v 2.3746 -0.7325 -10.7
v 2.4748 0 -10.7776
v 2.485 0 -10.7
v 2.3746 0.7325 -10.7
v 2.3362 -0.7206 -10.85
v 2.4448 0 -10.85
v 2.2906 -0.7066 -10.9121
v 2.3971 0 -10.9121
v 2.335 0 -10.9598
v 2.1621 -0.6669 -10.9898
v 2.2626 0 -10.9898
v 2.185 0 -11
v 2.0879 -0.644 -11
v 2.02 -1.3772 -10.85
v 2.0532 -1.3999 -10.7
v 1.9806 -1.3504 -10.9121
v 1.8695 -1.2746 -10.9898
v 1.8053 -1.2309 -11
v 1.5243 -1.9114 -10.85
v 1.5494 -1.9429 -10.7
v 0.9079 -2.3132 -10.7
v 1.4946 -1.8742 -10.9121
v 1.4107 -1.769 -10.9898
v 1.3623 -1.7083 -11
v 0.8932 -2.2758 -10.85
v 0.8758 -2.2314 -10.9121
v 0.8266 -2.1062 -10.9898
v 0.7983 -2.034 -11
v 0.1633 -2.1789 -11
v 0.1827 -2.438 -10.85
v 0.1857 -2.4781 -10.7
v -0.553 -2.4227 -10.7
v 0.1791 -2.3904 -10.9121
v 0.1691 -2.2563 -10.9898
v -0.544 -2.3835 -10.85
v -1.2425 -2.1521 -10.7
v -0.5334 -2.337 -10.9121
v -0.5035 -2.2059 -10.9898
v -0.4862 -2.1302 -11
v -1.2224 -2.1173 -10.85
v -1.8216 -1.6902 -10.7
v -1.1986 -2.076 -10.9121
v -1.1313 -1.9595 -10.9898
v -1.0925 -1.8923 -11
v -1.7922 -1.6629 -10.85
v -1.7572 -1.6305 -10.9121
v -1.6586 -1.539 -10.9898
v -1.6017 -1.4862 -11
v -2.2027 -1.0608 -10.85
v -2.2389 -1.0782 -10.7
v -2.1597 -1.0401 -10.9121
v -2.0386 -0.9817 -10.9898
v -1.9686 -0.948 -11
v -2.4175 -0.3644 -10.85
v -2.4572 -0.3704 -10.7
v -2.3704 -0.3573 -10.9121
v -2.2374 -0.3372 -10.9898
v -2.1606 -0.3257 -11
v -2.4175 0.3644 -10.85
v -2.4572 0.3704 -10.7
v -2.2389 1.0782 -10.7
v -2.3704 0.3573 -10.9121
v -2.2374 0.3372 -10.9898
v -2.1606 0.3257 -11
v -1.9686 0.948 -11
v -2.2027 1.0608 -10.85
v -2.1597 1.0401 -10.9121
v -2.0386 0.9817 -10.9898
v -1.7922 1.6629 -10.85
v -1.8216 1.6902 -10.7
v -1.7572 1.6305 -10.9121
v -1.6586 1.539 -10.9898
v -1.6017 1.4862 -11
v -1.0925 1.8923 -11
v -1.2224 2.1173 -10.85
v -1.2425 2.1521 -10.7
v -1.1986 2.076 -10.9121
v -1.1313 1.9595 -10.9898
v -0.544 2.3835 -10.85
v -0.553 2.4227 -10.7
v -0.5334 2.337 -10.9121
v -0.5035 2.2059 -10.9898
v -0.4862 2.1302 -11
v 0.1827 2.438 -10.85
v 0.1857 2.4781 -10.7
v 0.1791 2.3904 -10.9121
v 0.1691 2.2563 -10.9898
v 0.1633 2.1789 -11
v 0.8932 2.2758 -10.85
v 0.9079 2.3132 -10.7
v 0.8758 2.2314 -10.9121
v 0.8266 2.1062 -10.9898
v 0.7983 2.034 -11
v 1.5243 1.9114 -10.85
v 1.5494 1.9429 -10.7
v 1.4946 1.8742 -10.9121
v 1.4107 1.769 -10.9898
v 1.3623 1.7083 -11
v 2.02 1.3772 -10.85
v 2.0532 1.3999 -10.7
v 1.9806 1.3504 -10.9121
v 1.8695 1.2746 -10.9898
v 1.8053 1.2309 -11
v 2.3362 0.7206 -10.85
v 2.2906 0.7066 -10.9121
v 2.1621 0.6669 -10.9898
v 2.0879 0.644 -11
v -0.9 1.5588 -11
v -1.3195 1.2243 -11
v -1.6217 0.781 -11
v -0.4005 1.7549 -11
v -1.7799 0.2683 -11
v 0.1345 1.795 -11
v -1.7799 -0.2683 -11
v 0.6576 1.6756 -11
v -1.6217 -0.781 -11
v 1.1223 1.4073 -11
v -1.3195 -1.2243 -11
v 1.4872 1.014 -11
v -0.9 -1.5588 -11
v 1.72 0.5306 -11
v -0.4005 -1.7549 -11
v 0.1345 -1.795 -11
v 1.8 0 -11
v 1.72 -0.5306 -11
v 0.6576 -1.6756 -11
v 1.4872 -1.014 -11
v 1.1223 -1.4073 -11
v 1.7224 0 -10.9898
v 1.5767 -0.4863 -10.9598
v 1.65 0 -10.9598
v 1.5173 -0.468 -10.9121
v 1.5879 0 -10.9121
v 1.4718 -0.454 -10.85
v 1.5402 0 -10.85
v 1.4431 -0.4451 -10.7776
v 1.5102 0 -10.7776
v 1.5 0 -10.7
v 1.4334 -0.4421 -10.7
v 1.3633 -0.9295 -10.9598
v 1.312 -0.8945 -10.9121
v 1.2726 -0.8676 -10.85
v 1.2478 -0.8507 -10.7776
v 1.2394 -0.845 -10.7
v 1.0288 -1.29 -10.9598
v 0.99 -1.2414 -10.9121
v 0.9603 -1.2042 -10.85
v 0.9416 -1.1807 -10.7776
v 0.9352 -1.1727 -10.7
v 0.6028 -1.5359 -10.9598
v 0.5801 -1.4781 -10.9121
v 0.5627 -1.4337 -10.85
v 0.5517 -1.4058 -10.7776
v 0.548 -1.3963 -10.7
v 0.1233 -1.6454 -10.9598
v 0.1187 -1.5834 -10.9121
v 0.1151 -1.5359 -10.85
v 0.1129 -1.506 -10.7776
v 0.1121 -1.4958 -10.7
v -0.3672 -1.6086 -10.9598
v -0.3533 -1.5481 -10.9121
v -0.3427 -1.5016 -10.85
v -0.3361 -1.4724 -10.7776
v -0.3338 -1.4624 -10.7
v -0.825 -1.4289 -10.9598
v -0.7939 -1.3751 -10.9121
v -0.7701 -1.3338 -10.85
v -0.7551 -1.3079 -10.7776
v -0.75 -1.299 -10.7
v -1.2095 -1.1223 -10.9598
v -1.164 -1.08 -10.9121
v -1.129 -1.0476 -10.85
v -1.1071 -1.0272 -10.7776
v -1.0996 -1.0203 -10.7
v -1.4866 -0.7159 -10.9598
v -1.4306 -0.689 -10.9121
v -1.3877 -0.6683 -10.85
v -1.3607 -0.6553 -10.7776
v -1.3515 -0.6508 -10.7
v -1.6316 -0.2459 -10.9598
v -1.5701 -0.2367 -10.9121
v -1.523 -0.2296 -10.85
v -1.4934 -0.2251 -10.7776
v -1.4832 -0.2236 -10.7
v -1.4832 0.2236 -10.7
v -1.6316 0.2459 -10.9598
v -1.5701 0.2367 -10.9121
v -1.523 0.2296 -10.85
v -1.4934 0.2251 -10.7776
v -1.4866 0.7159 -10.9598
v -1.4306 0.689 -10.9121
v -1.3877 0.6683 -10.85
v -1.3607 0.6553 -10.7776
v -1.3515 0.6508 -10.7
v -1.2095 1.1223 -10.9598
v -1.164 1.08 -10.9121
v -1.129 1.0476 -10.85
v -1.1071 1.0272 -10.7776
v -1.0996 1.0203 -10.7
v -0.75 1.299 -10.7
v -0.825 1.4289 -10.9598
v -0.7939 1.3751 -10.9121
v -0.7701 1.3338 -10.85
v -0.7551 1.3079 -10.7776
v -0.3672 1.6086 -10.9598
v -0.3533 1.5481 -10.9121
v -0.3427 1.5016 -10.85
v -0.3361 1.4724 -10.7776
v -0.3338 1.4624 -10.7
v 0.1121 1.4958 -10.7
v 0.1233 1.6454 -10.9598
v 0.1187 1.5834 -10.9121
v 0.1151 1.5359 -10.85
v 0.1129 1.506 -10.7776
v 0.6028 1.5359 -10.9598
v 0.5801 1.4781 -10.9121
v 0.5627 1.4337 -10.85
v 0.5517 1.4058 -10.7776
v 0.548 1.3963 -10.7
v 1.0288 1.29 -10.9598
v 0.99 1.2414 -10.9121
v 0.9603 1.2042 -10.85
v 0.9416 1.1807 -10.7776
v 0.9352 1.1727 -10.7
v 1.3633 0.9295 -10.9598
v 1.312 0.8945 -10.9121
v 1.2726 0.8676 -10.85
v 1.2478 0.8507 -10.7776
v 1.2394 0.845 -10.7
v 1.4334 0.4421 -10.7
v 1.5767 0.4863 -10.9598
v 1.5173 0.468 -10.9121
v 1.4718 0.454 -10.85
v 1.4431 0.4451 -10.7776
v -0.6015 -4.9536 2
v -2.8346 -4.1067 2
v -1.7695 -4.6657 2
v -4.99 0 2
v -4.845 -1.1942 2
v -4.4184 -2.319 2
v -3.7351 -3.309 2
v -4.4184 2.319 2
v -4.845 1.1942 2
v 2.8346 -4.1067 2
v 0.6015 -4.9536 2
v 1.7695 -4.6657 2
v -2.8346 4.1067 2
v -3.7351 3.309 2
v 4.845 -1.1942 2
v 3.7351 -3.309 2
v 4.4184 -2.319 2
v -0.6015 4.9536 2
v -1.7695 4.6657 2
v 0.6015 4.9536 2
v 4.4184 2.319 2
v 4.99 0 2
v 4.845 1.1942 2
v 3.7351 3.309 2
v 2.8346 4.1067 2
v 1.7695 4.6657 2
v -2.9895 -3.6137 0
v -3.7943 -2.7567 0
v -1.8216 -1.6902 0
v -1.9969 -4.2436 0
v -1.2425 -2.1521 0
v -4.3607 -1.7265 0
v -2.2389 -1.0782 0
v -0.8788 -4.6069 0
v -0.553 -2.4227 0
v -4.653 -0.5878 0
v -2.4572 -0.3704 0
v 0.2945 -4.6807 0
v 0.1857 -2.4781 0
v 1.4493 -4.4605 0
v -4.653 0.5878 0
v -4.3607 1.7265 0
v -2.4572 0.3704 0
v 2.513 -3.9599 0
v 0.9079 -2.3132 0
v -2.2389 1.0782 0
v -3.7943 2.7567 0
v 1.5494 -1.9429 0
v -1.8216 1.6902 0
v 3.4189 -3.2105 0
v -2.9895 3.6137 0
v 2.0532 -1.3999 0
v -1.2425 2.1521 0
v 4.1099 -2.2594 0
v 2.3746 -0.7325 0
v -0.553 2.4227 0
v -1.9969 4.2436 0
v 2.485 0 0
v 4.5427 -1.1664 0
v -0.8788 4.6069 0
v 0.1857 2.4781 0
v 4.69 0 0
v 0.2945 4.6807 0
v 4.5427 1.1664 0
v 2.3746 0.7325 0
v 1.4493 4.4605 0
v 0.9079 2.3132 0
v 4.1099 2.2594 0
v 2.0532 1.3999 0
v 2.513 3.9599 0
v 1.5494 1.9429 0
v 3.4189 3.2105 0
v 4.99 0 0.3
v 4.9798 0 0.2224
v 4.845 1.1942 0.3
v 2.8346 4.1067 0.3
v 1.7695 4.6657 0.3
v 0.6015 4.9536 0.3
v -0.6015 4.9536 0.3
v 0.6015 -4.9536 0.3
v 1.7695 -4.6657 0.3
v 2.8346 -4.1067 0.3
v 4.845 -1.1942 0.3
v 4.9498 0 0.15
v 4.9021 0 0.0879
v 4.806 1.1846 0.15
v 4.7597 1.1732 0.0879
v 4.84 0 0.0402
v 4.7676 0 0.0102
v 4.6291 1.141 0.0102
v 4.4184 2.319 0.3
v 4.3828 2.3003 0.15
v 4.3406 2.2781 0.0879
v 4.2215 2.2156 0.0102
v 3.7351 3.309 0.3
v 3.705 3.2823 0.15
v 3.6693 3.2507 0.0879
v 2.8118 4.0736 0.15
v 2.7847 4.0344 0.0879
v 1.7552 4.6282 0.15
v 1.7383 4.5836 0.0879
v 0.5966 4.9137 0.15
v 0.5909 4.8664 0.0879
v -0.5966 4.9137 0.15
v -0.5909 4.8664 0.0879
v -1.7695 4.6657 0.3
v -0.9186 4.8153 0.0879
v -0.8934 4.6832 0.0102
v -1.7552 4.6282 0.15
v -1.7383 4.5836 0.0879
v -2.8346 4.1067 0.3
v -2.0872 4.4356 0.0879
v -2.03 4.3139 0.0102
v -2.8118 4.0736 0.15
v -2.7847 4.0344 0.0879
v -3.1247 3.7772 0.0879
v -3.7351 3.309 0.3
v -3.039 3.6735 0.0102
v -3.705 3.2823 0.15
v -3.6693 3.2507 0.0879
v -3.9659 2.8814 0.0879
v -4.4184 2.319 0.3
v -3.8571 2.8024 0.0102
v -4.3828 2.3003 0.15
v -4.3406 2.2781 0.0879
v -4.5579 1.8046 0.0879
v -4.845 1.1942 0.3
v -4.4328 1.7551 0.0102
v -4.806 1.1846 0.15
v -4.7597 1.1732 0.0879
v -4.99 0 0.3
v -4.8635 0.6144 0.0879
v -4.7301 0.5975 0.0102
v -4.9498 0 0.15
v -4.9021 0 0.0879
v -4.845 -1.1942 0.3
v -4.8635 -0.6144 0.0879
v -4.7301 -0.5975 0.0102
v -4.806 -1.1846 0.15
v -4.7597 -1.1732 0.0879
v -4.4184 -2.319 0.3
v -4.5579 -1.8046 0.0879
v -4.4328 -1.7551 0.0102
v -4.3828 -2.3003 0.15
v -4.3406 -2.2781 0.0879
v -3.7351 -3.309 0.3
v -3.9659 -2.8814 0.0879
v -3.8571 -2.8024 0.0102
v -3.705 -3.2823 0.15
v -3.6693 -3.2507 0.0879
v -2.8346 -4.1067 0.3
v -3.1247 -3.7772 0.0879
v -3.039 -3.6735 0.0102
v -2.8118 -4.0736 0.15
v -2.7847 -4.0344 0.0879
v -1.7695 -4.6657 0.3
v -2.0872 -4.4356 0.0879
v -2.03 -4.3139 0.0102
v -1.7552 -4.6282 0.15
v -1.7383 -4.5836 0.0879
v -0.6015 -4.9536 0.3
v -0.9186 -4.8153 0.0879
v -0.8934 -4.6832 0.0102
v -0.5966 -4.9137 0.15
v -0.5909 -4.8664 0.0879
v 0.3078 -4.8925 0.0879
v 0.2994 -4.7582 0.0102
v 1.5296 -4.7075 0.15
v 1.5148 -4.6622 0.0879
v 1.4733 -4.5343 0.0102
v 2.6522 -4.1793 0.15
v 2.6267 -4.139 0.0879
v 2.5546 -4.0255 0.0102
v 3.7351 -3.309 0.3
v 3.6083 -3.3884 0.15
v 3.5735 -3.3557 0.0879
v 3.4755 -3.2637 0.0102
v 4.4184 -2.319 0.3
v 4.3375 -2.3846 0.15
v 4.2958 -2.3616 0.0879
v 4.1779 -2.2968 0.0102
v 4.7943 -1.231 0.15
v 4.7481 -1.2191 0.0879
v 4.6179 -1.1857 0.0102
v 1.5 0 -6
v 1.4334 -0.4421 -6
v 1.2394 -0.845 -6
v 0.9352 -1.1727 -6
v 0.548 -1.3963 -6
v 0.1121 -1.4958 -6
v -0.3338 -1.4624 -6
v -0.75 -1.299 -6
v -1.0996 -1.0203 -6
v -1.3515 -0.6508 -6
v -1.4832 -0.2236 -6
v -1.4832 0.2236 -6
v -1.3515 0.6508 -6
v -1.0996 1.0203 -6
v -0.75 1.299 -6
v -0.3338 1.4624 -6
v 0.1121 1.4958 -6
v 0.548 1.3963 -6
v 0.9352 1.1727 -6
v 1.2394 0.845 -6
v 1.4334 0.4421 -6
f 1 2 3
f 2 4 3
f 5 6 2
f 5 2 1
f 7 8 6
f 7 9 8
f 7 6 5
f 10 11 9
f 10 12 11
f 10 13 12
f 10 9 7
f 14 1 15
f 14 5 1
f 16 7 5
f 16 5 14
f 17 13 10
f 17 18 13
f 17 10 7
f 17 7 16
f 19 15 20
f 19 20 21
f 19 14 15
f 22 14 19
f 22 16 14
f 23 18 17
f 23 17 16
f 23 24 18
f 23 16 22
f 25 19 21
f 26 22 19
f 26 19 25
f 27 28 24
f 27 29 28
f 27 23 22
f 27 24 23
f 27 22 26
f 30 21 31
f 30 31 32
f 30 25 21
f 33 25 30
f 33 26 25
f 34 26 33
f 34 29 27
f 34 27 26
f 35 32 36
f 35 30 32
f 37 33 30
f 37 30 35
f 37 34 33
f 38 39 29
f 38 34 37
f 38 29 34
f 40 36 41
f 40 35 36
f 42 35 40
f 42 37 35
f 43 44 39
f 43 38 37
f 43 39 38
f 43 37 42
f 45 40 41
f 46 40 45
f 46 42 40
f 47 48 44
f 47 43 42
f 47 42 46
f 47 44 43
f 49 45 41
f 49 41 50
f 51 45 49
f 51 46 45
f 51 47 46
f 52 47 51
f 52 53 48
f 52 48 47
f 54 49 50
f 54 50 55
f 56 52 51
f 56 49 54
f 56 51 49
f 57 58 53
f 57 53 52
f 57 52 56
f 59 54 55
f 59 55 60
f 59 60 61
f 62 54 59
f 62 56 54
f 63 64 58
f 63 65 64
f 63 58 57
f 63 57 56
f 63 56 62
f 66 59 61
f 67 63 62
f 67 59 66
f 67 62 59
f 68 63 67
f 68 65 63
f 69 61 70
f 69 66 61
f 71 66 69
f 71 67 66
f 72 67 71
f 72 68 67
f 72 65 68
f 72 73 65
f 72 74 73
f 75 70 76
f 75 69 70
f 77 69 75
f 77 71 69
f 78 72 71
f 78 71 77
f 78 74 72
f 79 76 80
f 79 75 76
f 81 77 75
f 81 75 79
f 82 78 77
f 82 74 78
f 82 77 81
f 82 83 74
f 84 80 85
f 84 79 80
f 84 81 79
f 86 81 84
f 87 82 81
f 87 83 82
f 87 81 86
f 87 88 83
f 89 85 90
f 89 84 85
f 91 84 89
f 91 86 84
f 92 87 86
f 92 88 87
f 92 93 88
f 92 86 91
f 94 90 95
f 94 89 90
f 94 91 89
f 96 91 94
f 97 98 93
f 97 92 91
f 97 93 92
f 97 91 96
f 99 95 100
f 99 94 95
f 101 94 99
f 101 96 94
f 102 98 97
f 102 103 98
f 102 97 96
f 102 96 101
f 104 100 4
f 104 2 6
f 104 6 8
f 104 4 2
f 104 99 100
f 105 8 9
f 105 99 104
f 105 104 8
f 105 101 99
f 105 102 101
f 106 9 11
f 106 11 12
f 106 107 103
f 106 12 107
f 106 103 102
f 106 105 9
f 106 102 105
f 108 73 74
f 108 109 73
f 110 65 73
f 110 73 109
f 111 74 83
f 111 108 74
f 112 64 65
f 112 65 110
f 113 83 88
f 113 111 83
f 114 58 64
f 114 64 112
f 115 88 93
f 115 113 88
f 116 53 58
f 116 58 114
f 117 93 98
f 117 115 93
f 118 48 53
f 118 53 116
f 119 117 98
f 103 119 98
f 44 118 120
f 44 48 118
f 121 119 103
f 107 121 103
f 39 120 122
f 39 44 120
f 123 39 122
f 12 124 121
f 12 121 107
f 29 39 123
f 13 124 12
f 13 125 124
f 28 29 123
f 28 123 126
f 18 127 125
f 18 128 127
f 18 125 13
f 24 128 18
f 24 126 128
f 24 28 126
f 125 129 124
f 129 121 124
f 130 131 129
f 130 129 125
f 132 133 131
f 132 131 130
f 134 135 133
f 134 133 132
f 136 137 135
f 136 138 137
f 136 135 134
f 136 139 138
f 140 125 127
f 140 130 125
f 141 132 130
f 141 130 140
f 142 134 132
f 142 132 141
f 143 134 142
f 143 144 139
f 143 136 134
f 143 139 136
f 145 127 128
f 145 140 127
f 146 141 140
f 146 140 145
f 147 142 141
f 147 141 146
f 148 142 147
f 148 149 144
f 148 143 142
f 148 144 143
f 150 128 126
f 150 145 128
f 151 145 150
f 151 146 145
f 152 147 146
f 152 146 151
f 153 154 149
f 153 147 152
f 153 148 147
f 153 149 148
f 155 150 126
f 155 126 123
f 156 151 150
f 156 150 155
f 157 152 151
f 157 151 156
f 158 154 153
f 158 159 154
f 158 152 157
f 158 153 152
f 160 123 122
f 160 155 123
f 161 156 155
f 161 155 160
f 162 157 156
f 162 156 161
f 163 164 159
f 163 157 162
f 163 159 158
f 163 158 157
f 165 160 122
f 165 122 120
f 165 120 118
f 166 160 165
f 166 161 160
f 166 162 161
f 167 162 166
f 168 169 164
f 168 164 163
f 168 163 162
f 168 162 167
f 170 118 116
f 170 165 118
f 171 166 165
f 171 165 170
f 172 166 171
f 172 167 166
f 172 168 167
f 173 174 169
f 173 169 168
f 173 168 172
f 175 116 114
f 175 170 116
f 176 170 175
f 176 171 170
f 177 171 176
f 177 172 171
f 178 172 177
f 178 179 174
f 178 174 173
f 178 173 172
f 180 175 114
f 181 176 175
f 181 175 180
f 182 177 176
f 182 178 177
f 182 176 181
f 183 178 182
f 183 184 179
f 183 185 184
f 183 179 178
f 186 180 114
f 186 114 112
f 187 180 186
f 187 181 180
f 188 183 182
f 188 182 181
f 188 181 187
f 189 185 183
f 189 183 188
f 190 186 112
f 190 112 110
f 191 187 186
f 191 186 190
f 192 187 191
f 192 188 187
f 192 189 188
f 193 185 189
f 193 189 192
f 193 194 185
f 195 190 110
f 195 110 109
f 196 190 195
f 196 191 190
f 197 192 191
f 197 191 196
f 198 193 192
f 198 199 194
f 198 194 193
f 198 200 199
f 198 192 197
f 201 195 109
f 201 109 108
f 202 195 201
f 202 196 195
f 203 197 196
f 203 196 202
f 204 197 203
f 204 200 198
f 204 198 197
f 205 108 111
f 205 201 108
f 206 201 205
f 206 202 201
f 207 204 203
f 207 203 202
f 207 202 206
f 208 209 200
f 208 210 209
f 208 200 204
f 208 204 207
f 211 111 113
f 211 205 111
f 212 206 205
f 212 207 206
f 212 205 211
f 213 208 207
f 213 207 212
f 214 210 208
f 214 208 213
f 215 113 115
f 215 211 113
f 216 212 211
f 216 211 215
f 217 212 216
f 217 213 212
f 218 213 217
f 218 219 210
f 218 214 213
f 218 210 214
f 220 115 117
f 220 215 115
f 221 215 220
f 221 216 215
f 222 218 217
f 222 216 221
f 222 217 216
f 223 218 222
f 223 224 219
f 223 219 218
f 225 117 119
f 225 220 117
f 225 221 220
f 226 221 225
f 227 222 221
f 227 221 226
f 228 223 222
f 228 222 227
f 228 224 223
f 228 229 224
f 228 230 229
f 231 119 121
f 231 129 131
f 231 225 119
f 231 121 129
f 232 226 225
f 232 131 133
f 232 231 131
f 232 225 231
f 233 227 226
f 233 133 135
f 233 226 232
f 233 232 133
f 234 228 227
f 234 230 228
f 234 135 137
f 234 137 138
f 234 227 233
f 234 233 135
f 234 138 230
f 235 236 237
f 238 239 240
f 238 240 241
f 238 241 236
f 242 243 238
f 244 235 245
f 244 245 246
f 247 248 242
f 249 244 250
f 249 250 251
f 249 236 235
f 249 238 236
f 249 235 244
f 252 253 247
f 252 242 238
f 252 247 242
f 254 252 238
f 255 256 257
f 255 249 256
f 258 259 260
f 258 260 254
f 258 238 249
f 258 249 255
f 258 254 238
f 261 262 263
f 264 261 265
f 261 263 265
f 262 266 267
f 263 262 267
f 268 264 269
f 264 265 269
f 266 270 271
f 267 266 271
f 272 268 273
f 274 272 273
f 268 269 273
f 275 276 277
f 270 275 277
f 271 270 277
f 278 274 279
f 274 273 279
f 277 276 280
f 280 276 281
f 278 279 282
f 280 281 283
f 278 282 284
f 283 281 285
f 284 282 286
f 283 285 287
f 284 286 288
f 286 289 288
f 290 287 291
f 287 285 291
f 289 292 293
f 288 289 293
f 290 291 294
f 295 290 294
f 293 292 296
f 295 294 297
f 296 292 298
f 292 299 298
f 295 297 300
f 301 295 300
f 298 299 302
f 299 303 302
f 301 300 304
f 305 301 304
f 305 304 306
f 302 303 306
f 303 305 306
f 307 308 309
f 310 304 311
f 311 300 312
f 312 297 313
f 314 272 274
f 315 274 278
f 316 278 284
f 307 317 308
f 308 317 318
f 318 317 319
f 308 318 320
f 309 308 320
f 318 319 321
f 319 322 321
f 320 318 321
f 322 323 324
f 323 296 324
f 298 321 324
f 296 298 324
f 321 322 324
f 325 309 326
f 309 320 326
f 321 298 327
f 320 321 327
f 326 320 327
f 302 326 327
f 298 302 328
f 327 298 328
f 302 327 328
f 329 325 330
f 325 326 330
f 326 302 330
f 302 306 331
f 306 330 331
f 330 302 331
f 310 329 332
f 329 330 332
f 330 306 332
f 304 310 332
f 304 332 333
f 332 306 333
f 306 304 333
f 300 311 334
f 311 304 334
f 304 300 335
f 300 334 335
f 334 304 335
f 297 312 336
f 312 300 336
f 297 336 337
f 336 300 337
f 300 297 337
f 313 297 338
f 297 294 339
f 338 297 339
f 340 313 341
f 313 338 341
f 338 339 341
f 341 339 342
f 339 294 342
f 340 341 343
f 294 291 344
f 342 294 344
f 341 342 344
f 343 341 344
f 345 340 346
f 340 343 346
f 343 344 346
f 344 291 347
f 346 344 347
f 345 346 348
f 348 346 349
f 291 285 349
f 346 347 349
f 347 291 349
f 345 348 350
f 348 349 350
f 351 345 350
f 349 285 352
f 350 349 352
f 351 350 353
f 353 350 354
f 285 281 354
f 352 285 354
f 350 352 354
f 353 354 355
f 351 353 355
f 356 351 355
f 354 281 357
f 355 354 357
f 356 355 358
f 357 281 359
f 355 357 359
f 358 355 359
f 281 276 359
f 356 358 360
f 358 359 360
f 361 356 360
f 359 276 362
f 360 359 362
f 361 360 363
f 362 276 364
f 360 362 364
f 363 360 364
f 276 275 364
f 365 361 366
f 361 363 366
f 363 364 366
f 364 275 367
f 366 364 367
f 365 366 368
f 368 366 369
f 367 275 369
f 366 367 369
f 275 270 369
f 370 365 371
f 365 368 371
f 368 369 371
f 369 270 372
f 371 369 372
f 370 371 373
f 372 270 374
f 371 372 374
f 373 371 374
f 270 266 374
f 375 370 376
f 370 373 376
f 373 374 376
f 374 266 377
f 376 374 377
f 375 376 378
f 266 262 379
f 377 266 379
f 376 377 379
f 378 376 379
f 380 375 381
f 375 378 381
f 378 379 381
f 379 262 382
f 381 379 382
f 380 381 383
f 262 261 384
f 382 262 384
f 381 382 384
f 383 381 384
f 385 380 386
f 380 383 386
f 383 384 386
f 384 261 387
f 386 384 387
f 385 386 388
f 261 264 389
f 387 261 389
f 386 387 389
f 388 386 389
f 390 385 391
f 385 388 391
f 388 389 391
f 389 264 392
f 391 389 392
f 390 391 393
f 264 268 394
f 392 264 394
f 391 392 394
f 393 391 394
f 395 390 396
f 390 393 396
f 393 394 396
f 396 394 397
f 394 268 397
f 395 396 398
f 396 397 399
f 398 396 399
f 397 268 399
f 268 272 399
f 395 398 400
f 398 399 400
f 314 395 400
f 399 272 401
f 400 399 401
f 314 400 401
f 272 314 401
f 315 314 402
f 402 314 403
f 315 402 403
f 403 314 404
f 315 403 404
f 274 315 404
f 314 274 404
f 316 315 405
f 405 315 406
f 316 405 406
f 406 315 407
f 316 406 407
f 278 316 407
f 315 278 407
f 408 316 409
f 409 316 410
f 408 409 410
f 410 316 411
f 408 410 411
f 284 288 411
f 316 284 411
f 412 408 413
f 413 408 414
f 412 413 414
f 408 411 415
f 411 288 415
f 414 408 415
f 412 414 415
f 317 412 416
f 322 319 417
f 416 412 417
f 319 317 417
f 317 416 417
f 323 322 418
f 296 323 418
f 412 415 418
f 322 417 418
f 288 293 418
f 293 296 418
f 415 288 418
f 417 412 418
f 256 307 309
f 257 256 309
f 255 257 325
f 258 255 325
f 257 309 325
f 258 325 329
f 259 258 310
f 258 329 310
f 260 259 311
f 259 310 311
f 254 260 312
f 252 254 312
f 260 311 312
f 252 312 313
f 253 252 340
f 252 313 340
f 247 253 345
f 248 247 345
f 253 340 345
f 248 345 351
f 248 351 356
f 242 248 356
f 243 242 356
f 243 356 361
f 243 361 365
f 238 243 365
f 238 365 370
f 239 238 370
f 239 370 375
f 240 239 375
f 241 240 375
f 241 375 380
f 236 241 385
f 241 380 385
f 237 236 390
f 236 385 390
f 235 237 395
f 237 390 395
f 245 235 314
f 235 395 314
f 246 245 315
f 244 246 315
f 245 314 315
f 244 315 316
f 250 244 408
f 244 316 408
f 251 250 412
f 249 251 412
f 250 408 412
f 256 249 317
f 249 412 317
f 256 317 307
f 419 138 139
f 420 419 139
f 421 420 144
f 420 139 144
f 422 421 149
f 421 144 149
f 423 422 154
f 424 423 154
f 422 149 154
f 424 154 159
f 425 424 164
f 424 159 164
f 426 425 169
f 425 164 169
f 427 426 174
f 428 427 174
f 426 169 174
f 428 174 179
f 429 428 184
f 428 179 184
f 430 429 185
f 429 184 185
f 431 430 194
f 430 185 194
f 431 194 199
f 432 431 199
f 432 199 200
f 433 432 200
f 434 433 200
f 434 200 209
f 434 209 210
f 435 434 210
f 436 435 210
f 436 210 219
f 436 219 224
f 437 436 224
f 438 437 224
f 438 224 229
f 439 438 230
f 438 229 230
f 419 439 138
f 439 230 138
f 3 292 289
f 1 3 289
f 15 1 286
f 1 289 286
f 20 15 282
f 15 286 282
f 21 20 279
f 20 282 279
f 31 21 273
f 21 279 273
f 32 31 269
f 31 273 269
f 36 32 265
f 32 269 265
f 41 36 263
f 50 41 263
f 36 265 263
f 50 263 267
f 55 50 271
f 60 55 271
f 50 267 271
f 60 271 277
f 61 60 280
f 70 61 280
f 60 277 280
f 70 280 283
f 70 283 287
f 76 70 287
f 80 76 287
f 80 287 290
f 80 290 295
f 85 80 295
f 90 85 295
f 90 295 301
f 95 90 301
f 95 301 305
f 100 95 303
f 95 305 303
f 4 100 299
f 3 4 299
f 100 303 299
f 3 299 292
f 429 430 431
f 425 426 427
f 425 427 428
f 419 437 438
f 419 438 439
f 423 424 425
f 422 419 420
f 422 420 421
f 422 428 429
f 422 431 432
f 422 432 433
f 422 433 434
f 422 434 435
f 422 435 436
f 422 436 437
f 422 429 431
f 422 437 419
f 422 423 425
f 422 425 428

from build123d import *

# Parameters (mm, degrees)
F0_R     = 4.99
F1_DEPTH = 2
F2_R     = 2.485
F3_DEPTH = 11
F4_R     = 1.5
F5_DEPTH = 5
F6_R     = 0.3


with BuildPart() as f1:
    # F0 (on Top) → F1 (new body)
    with BuildSketch(Plane.XY):
        Circle(F0_R)
    extrude(amount=F1_DEPTH)

    # F2 (on face) → F3 (join)
    with BuildSketch(Plane(origin=(0, 0, 0), x_dir=(1, 0, 0), z_dir=(0, 0, -1))):
        Circle(F2_R)
    extrude(amount=F3_DEPTH)

    # F4 (on face) → F5 (cut)
    with BuildSketch(Plane(origin=(0, 0, -11), x_dir=(1, 0, 0), z_dir=(0, 0, -1))):
        Circle(F4_R)
    extrude(amount=-F5_DEPTH, mode=Mode.SUBTRACT)

    # F6
    f6_edges = [f1.edges().sort_by_distance(p)[0] for p in [
        (-2.485, 0, -11),
        (-1.5, 0, -11),
        (-4.99, 0, 0),
    ]]
    fillet(f6_edges, radius=F6_R)


solid = f1.part
